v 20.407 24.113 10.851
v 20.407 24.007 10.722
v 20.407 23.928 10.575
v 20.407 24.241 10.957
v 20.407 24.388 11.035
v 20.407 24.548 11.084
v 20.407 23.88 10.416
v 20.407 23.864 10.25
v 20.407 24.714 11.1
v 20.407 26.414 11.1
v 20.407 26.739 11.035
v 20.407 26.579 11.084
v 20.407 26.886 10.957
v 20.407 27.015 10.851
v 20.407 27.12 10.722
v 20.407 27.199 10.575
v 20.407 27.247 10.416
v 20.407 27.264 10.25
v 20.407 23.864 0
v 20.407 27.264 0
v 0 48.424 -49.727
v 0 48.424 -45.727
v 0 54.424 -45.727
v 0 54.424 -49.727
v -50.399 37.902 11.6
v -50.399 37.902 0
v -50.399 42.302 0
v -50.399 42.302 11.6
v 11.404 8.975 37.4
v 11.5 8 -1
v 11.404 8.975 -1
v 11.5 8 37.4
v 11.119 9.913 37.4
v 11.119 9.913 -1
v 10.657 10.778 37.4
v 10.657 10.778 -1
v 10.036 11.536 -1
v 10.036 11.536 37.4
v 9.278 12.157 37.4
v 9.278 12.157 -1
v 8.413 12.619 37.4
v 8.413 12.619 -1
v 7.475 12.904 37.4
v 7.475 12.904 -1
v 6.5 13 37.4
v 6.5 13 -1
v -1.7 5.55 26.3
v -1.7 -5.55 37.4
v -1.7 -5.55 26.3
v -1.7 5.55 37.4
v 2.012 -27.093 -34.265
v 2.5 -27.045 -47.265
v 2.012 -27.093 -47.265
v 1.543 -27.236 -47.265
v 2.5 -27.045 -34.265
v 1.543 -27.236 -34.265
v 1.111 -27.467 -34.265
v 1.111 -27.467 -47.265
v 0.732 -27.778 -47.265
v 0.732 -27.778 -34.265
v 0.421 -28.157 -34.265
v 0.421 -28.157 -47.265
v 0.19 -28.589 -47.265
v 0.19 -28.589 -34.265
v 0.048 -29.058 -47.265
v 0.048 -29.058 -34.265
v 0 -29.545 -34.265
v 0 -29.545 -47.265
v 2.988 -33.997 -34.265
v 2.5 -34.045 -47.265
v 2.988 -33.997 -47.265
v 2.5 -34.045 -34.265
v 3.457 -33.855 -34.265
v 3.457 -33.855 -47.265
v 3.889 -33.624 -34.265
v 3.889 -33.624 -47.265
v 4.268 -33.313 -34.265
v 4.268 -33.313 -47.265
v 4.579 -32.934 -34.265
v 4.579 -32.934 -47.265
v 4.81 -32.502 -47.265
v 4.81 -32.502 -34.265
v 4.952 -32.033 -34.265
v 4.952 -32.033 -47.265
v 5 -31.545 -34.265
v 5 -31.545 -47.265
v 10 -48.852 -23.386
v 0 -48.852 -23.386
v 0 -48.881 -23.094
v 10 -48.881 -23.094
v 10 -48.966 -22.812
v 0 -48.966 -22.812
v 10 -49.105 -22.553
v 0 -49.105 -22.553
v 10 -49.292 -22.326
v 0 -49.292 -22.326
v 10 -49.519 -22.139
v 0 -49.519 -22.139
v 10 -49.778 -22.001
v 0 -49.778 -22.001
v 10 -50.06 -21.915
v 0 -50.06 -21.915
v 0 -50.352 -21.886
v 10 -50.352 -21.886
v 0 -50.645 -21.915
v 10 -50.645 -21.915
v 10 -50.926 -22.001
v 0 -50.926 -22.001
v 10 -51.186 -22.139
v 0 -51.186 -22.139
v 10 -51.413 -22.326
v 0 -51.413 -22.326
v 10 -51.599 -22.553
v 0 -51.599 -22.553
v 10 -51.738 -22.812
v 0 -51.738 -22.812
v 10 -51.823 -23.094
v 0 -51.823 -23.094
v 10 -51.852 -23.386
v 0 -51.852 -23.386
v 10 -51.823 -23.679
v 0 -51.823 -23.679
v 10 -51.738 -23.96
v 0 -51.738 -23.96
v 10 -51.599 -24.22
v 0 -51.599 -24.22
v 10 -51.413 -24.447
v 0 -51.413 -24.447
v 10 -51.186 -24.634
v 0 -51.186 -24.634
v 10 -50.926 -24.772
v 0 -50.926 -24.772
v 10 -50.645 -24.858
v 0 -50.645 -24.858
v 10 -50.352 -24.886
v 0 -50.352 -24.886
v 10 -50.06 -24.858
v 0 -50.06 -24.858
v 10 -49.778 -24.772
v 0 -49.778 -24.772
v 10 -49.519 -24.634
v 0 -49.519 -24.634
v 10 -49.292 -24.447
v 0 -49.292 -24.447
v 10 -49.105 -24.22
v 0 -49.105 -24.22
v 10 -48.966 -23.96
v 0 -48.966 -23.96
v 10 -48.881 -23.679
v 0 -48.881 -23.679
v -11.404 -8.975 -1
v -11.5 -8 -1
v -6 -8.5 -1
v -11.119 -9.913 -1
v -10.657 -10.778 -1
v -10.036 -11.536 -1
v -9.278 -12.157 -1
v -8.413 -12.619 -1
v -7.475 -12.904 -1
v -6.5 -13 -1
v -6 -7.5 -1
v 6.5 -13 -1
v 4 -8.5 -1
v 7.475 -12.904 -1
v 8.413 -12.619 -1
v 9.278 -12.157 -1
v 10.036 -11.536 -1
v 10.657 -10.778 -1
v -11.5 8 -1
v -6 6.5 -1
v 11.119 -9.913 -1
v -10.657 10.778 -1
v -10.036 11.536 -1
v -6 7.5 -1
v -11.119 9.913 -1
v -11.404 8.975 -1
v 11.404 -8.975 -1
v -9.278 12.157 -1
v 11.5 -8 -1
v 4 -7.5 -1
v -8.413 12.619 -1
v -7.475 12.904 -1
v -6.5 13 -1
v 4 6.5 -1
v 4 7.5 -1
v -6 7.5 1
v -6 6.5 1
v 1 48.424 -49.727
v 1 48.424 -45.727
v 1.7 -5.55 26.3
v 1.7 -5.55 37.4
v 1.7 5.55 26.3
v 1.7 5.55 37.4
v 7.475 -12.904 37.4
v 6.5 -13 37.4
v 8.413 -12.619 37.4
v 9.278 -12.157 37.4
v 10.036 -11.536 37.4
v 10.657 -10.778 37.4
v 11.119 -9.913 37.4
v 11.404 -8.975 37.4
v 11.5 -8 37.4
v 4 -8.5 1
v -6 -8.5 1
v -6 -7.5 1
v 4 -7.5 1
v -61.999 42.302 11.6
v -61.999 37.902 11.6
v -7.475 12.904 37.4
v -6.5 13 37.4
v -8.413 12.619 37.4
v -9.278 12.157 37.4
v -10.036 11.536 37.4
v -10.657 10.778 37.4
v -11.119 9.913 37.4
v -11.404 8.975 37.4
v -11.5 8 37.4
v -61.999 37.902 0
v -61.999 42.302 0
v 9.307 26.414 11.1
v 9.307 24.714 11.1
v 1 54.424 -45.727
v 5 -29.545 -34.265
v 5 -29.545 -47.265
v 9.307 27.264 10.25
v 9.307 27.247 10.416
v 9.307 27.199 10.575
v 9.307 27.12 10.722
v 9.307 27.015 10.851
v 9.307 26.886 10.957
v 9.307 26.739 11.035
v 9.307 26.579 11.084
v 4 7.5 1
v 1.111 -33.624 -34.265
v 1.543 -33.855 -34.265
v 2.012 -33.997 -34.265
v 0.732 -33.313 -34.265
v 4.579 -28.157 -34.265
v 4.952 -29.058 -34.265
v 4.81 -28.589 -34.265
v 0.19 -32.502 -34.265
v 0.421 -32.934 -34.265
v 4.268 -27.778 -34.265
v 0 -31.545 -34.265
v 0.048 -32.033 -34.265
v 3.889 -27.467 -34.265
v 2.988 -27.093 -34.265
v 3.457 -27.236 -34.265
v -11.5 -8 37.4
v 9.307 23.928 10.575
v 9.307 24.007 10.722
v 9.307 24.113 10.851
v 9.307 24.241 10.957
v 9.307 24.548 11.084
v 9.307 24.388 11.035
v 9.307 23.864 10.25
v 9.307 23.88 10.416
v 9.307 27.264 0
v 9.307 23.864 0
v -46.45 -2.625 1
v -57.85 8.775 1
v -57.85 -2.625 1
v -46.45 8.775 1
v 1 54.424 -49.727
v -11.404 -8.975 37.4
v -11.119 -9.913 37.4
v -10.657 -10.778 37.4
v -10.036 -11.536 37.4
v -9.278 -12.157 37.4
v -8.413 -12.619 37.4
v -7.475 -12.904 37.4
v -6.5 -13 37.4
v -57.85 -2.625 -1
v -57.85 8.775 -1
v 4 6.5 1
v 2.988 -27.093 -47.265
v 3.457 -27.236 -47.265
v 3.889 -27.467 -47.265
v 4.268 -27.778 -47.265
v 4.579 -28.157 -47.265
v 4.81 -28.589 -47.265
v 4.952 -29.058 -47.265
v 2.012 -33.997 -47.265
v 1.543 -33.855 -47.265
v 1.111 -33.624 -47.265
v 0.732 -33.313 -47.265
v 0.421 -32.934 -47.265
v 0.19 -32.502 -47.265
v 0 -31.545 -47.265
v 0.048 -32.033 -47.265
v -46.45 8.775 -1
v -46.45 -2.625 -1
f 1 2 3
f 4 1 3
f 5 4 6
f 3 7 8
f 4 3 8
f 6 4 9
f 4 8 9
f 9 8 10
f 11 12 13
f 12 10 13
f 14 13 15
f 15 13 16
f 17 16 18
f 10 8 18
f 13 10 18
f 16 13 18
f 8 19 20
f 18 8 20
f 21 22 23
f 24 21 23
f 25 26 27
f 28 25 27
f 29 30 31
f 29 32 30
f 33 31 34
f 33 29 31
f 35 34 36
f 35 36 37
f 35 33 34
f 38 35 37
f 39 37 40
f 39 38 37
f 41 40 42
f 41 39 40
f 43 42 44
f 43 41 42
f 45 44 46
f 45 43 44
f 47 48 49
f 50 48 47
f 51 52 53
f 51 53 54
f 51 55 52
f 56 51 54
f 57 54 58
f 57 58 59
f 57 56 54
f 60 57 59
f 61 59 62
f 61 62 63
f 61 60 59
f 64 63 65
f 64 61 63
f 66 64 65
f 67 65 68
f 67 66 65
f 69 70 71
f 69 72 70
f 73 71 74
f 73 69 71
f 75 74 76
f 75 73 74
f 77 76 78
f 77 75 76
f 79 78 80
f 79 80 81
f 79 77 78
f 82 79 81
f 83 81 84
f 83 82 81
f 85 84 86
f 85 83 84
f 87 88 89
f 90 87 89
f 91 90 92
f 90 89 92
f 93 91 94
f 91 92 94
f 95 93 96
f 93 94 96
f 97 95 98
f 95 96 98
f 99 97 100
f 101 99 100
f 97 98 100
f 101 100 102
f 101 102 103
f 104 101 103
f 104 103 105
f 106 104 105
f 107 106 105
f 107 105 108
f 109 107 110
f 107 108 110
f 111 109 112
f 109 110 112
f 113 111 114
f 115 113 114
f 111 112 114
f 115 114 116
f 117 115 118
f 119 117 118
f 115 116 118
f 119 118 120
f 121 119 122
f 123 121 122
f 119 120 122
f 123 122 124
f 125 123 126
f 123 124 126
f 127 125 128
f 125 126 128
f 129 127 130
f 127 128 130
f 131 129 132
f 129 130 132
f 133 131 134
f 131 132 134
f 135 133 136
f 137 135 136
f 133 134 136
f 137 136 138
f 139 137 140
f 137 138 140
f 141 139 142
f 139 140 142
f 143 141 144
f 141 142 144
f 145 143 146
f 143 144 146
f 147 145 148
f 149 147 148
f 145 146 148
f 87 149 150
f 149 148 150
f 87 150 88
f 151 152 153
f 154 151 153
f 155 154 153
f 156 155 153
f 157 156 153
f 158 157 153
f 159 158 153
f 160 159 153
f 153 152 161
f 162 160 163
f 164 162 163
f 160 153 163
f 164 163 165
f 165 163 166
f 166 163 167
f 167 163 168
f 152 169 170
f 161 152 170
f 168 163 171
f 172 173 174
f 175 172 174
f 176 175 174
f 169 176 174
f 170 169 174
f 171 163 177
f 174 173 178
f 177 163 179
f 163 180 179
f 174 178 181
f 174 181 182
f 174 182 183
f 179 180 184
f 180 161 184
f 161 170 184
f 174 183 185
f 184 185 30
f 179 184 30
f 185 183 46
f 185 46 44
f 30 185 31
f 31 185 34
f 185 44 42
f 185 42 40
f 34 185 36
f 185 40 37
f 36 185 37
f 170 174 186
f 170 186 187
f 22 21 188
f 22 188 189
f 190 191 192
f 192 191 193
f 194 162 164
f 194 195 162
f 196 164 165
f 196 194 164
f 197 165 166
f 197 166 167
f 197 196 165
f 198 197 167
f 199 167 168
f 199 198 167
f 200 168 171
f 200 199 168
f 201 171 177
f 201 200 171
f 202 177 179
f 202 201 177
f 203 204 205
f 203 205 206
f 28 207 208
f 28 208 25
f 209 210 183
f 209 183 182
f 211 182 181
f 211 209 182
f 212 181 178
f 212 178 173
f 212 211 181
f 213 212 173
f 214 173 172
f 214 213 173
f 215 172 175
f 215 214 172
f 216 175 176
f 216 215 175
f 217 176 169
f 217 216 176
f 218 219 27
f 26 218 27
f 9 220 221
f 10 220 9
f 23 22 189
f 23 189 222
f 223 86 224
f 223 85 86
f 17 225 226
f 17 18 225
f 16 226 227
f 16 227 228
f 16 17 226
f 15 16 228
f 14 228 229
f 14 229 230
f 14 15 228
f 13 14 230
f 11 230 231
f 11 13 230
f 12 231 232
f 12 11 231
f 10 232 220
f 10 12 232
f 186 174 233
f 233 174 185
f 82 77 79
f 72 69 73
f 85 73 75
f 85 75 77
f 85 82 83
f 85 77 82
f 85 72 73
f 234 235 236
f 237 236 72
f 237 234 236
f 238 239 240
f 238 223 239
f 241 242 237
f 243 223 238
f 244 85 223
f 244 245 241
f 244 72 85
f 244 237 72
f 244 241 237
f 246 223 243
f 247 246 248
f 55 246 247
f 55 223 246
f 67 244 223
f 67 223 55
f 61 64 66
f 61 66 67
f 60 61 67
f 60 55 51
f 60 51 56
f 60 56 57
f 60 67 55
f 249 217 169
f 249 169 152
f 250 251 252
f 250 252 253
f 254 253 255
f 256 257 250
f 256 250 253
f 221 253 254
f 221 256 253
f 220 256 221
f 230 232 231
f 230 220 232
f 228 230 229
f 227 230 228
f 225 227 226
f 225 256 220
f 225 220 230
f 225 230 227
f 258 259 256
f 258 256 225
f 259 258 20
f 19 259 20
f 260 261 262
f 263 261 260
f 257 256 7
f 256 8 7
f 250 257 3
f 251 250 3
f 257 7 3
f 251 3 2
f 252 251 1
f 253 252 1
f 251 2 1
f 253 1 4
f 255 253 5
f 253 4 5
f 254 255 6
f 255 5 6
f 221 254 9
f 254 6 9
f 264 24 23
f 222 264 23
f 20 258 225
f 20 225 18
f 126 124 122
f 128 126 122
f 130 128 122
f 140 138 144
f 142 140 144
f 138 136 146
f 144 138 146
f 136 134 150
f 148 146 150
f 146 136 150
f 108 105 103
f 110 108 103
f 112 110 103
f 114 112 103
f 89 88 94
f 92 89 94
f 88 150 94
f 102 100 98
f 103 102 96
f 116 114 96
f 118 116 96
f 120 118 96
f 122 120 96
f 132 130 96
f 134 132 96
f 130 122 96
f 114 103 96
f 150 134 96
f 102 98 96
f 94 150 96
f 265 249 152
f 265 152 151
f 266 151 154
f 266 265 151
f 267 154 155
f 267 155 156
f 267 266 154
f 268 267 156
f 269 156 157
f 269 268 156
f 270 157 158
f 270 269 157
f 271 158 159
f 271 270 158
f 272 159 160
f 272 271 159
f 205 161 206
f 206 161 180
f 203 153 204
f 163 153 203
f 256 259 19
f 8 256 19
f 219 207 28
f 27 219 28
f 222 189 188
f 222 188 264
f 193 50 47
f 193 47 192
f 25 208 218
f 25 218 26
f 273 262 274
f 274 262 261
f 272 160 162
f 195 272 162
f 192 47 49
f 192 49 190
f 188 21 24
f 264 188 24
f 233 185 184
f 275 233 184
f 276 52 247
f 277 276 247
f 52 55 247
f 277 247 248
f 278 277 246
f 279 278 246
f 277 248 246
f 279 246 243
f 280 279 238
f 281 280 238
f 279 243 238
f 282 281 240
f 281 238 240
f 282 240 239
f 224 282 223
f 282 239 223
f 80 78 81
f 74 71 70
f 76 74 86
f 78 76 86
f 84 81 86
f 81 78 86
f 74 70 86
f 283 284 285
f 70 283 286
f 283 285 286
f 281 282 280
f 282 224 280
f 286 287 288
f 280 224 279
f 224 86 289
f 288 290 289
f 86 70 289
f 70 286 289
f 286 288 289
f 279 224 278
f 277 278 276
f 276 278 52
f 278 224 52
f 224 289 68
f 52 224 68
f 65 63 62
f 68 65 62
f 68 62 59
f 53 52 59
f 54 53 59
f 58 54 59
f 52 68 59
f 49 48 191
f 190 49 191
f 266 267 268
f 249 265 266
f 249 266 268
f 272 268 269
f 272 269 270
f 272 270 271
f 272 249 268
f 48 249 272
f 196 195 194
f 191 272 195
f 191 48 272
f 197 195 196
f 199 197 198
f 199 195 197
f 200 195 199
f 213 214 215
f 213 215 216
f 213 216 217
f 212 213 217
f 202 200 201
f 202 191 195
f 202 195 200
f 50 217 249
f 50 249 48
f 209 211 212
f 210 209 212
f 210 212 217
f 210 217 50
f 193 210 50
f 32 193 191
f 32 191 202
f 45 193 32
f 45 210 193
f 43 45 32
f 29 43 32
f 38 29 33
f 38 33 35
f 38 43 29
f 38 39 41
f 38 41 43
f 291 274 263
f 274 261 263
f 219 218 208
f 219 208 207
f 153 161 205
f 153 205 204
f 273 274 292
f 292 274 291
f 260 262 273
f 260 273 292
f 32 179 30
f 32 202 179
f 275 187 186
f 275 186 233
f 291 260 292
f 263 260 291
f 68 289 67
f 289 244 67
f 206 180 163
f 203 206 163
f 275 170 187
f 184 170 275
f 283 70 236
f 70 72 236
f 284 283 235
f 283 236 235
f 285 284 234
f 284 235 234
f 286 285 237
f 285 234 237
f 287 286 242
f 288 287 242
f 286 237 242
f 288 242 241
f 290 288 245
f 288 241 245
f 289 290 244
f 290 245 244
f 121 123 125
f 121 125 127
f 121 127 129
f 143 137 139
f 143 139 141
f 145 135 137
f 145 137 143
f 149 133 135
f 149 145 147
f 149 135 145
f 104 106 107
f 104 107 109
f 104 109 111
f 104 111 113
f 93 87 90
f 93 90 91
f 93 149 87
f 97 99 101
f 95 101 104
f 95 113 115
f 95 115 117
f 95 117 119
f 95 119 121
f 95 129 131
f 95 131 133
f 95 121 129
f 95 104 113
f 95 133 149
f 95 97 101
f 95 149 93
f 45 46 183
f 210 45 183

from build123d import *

# Parameters (mm, degrees)
F1_DEPTH      = 37.4
F2_DEPTH      = 1
F2_DEPTH_BACK = 1
F0_W          = 11.4
F0_H          = 11.4
F4_W          = 11.1
F4_H          = 3.4
F5_DEPTH      = 11.1
F6_W          = 11.6
F6_H          = 4.4
F7_DEPTH      = 11.6
F8_R          = 1.5
F9_DEPTH      = 10
F10_W         = 6
F10_H         = 4
F11_DEPTH     = 1
F12_W         = 7
F12_H         = 13
F13_DEPTH     = 5
F14_R         = 2.49999
F15_W         = 3.4
F15_H         = 11.1
F16_DEPTH     = 11.1
F17_R         = 0.85
F18_W         = 10
F18_H         = 1
F19_DEPTH     = 2


# Not quite as in the source:
# - a fillet or chamfer is up to 0.001 mm smaller than in the source, because OpenCascade refuses the exact size


with BuildPart() as f1:
    # F0 (on Top) → F1 (new body)
    with BuildSketch(Plane.XY):
        with BuildLine():
            ThreePointArc((11.5, 8), (10.0355339059, 11.5355339059), (6.5, 13))
            Line((6.5, 13), (-6.5, 13))
            ThreePointArc((-6.5, 13), (-10.0355339059, 11.5355339059), (-11.5, 8))
            Line((-11.5, 8), (-11.5, -8))
            ThreePointArc((-11.5, -8), (-10.0355339059, -11.5355339059), (-6.5, -13))
            Line((-6.5, -13), (6.5, -13))
            ThreePointArc((6.5, -13), (10.0355339059, -11.5355339059), (11.5, -8))
            Line((11.5, -8), (11.5, 8))
        make_face()
    extrude(amount=F1_DEPTH)

    # F0 (on Top) → F2 (join, two sides)
    with BuildSketch(Plane.XY) as f2_sk:
        with BuildLine():
            ThreePointArc((11.5, 8), (10.0355339059, 11.5355339059), (6.5, 13))
            Line((6.5, 13), (-6.5, 13))
            ThreePointArc((-6.5, 13), (-10.0355339059, 11.5355339059), (-11.5, 8))
            Line((-11.5, 8), (-11.5, -8))
            ThreePointArc((-11.5, -8), (-10.0355339059, -11.5355339059), (-6.5, -13))
            Line((-6.5, -13), (6.5, -13))
            ThreePointArc((6.5, -13), (10.0355339059, -11.5355339059), (11.5, -8))
            Line((11.5, -8), (11.5, 8))
        make_face()
    extrude(amount=F2_DEPTH)
    extrude(f2_sk.sketch, amount=-F2_DEPTH_BACK)

    # F15 (on face) → F16 (cut)
    with BuildSketch(Plane.XY.offset(37.4)):
        Rectangle(F15_W, F15_H)
    extrude(amount=-F16_DEPTH, mode=Mode.SUBTRACT)

    # F18 (on face) → F19 (cut)
    with BuildSketch(Plane(origin=(0, 0, -1), x_dir=(1, 0, 0), z_dir=(0, 0, -1))):
        with Locations((-1, -7)):
            Rectangle(F18_W, F18_H)
        with Locations((-1, 8)):
            Rectangle(F18_W, F18_H)
    extrude(amount=-F19_DEPTH, mode=Mode.SUBTRACT)


with BuildPart() as f2:
    # F0 (on Top) → F2, piece 2 (new body, two sides)
    with BuildSketch(Plane.XY) as f2_2_sk:
        with Locations((-52.1503757715, 3.0749998026)):
            Rectangle(F0_W, F0_H)
    extrude(amount=F2_DEPTH)
    extrude(f2_2_sk.sketch, amount=-F2_DEPTH_BACK)


with BuildPart() as f5:
    # F4 (on Top) → F5 (new body)
    with BuildSketch(Plane.XY):
        with Locations((14.8568219721, 25.5636378199)):
            Rectangle(F4_W, F4_H)
    extrude(amount=F5_DEPTH)

    # F17
    f17_edges = [f5.edges().sort_by_distance(p)[0] for p in [
        (14.856822, 27.263638, 11.1),
        (14.856822, 23.863638, 11.1),
    ]]
    fillet(f17_edges, radius=F17_R)


with BuildPart() as f7:
    # F6 (on Top) → F7 (new body)
    with BuildSketch(Plane.XY):
        with Locations((-56.1988651752, 40.1015764561)):
            Rectangle(F6_W, F6_H)
    extrude(amount=F7_DEPTH)


with BuildPart() as f9:
    # F8 (on Right) → F9 (new body)
    with BuildSketch(Plane.YZ):
        with Locations((-50.3522753716, -23.3863648027)):
            Circle(F8_R)
    extrude(amount=F9_DEPTH)


with BuildPart() as f11:
    # F10 (on Right) → F11 (new body)
    with BuildSketch(Plane.YZ):
        with Locations((51.4242419054, -47.7272756398)):
            Rectangle(F10_W, F10_H)
    extrude(amount=F11_DEPTH)


with BuildPart() as f13:
    # F12 (on Right) → F13 (new body)
    with BuildSketch(Plane.YZ):
        with Locations((-30.5454554036, -40.7653002545)):
            Rectangle(F12_W, F12_H)
    extrude(amount=F13_DEPTH)

    # F14 (radius 2.5 in the source; OpenCascade refuses exactly that, so slightly less here)
    f14_edges = [f13.edges().sort_by_distance(p)[0] for p in [
        (5, -34.045455, -40.7653),
        (5, -27.045455, -40.7653),
        (0, -27.045455, -40.7653),
        (0, -34.045455, -40.7653),
    ]]
    fillet(f14_edges, radius=F14_R)


solid = Compound([f1.part, f2.part, f5.part, f7.part, f9.part, f11.part, f13.part])
